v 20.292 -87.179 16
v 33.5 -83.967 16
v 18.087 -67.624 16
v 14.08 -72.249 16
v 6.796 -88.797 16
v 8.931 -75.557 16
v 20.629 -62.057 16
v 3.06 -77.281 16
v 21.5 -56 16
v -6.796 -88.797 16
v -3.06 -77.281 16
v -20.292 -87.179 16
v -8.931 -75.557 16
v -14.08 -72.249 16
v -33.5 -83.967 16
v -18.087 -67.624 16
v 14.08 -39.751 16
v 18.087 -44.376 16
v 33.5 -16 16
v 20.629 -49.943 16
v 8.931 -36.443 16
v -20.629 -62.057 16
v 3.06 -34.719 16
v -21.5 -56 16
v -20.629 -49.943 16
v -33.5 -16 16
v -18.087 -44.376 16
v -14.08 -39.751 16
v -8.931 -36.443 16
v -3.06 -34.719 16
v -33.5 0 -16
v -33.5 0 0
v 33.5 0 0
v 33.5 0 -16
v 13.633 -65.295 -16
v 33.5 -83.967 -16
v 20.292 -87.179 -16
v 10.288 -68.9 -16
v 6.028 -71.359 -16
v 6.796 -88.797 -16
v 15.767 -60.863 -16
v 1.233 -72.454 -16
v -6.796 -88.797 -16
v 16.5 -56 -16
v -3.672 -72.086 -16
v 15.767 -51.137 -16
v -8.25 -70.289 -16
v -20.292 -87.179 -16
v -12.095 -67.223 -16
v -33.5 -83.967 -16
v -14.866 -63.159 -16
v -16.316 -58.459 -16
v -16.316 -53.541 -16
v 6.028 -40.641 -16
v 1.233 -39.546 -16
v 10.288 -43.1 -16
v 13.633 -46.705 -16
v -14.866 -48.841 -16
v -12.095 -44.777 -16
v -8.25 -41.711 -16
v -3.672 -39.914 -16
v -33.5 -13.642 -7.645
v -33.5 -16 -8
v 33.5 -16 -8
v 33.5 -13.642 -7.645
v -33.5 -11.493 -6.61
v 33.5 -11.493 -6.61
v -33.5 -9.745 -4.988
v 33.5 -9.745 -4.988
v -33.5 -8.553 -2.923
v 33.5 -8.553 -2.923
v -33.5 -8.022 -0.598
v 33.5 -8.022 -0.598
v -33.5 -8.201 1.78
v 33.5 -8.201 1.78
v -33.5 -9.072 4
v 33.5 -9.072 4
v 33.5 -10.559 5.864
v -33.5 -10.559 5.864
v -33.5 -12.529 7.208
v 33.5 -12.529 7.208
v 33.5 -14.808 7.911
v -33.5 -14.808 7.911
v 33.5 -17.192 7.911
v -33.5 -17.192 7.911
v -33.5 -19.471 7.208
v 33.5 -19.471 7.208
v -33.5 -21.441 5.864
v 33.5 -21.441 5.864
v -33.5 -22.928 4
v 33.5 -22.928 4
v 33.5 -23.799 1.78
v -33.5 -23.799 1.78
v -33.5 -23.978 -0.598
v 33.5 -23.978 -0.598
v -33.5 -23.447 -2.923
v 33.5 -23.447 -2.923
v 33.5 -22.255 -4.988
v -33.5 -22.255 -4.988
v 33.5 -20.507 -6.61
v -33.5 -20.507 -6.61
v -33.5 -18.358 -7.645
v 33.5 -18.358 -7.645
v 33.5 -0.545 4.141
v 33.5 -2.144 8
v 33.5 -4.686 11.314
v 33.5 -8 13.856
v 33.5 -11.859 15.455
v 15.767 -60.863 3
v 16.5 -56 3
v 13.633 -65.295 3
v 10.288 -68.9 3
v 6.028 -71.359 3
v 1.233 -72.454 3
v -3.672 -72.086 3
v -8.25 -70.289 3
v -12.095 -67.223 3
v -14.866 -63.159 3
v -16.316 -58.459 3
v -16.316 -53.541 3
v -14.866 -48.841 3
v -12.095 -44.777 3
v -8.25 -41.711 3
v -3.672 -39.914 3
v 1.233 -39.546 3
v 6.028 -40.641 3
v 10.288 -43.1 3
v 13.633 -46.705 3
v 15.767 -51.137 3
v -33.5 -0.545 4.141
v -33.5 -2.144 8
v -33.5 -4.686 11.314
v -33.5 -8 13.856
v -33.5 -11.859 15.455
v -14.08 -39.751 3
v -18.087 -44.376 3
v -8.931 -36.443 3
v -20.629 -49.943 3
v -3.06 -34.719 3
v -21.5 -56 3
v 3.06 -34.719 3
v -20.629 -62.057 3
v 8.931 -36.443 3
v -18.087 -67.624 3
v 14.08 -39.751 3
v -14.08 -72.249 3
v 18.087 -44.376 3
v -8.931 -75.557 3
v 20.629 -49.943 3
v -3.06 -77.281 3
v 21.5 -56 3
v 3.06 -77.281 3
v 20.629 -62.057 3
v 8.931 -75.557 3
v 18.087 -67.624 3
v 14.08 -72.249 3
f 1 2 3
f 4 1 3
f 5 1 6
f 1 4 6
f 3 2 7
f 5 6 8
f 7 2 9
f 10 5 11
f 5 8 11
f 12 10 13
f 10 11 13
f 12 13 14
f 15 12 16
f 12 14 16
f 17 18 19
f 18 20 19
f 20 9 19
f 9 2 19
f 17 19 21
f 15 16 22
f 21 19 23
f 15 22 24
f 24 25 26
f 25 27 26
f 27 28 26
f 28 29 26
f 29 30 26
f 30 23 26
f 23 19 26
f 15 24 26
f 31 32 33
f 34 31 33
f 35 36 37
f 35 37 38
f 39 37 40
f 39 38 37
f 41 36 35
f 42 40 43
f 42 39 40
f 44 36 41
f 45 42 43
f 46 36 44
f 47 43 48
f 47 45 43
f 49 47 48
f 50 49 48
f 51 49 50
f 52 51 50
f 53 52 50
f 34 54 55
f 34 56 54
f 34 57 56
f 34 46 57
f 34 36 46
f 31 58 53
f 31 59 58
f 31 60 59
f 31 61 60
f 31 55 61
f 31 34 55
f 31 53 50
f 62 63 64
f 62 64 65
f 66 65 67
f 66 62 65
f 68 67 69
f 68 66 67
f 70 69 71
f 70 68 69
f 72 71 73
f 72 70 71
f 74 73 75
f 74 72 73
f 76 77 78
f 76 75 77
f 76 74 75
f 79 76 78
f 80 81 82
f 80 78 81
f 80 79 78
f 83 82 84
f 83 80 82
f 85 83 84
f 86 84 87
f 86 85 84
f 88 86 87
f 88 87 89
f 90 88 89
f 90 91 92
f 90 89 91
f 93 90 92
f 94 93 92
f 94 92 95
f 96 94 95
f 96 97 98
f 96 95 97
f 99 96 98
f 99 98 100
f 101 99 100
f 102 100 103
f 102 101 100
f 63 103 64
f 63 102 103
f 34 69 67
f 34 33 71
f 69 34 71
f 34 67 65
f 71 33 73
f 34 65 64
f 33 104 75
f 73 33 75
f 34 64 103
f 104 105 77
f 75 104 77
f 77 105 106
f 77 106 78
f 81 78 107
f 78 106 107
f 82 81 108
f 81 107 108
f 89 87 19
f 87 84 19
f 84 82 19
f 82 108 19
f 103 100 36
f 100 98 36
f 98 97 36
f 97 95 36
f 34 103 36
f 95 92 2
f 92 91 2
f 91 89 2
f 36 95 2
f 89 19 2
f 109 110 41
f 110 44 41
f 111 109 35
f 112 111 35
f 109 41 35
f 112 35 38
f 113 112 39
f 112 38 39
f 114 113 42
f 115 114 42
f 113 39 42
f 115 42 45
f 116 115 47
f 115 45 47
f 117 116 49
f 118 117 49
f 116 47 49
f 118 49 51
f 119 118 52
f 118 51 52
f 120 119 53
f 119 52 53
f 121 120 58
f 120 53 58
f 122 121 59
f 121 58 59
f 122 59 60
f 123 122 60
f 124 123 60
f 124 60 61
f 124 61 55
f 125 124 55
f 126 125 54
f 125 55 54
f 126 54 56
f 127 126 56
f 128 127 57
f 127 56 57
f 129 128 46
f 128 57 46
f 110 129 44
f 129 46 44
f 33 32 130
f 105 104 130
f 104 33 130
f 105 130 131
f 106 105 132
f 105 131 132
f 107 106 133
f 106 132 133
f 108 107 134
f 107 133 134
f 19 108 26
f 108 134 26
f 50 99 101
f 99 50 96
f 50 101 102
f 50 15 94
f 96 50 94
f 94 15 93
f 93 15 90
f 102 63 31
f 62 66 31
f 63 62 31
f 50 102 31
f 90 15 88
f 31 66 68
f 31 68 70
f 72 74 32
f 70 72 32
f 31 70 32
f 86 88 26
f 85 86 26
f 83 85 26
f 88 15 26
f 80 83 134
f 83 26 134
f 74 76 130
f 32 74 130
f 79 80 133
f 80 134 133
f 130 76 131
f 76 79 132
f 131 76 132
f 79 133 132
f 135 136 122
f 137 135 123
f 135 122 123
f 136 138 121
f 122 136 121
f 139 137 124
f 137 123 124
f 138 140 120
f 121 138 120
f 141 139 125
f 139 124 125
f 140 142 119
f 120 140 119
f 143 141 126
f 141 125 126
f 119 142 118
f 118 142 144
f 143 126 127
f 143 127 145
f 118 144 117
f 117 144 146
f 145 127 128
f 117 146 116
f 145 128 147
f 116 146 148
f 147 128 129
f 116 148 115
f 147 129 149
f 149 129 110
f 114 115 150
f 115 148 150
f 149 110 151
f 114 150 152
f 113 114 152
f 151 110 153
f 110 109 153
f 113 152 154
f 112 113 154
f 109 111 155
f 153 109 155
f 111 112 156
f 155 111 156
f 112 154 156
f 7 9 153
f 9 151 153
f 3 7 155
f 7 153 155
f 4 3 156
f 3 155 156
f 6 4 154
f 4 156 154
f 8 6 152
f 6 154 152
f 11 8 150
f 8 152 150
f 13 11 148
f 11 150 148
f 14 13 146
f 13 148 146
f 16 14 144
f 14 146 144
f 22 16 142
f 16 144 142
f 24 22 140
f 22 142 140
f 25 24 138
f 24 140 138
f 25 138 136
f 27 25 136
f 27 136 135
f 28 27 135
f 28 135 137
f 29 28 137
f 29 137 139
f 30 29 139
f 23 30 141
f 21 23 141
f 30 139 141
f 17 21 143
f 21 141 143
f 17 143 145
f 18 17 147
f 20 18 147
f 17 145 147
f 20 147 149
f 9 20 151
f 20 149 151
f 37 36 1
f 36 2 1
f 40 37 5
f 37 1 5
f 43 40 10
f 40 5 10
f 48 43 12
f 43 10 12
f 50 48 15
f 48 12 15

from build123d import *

# Parameters (mm, degrees)
Y_KSEKLIK_EKSTR_ZYON1_DEPTH = 16
KES_EKSTR_ZYON1_DEPTH       = 97.432618963
KES_EKSTR_ZYON1_DEPTH_BACK  = 97.432618963
KES_EKSTR_ZYON2_DEPTH       = 97.432618963
KES_EKSTR_ZYON2_DEPTH_BACK  = 97.432618963
IZIM3_R                     = 8


with BuildPart() as part:
    # Çizim1 → Yükseklik-Ekstrüzyon1 (new, symmetric)
    with BuildSketch(Plane.XY):
        with BuildLine():
            Line((-33.5, 0), (33.5, 0))
            Line((33.5, 0), (33.5, -83.966738044))
            ThreePointArc((33.5, -83.966738044), (0, -89), (-33.5, -83.966738044))
            Line((-33.5, -83.966738044), (-33.5, 0))
        make_face()
    extrude(amount=Y_KSEKLIK_EKSTR_ZYON1_DEPTH, both=True)

    # Çizim2 → Kes-Ekstrüzyon1 (cut, two sides: drawn at the far end of the back side and taken through both)
    with BuildSketch(Plane(origin=(0, 0, 0), x_dir=(0, 0, -1), z_dir=(1, 0, 0)).offset(-KES_EKSTR_ZYON1_DEPTH_BACK)):
        with BuildLine():
            Line((-16, -16), (-16, 0))
            Line((-16, 0), (0, 0))
            ThreePointArc((0, 0), (-11.313708499, -4.686291501), (-16, -16))
        make_face()
    extrude(amount=KES_EKSTR_ZYON1_DEPTH + KES_EKSTR_ZYON1_DEPTH_BACK, mode=Mode.SUBTRACT)

    # Çizim3 → Kes-Ekstrüzyon2 (cut, two sides: drawn at the far end of the back side and taken through both)
    with BuildSketch(Plane(origin=(0, 0, 0), x_dir=(0, 0, -1), z_dir=(1, 0, 0)).offset(-KES_EKSTR_ZYON2_DEPTH_BACK)):
        with Locations((0, -16)):
            Circle(IZIM3_R)
    extrude(amount=KES_EKSTR_ZYON2_DEPTH + KES_EKSTR_ZYON2_DEPTH_BACK, mode=Mode.SUBTRACT)

    # Çizim4 → Kes-Döndür1 (revolve, cut)
    with BuildSketch(Plane(origin=(0, 0, 0), x_dir=(0, 0, -1), z_dir=(1, 0, 0)), mode=Mode.PRIVATE) as kes_d_nd_r1_sk:
        Polygon((-16, -34.5), (-3, -34.5), (-3, -39.5), (16, -39.5), (16, -56), (-16, -56), align=None)
    revolve(kes_d_nd_r1_sk.sketch.rotate(Axis((0, -56, 16), (0, 0, -1)), 90), axis=Axis((0, -56, 16), (0, 0, -1)), mode=Mode.SUBTRACT)


solid = part.part
